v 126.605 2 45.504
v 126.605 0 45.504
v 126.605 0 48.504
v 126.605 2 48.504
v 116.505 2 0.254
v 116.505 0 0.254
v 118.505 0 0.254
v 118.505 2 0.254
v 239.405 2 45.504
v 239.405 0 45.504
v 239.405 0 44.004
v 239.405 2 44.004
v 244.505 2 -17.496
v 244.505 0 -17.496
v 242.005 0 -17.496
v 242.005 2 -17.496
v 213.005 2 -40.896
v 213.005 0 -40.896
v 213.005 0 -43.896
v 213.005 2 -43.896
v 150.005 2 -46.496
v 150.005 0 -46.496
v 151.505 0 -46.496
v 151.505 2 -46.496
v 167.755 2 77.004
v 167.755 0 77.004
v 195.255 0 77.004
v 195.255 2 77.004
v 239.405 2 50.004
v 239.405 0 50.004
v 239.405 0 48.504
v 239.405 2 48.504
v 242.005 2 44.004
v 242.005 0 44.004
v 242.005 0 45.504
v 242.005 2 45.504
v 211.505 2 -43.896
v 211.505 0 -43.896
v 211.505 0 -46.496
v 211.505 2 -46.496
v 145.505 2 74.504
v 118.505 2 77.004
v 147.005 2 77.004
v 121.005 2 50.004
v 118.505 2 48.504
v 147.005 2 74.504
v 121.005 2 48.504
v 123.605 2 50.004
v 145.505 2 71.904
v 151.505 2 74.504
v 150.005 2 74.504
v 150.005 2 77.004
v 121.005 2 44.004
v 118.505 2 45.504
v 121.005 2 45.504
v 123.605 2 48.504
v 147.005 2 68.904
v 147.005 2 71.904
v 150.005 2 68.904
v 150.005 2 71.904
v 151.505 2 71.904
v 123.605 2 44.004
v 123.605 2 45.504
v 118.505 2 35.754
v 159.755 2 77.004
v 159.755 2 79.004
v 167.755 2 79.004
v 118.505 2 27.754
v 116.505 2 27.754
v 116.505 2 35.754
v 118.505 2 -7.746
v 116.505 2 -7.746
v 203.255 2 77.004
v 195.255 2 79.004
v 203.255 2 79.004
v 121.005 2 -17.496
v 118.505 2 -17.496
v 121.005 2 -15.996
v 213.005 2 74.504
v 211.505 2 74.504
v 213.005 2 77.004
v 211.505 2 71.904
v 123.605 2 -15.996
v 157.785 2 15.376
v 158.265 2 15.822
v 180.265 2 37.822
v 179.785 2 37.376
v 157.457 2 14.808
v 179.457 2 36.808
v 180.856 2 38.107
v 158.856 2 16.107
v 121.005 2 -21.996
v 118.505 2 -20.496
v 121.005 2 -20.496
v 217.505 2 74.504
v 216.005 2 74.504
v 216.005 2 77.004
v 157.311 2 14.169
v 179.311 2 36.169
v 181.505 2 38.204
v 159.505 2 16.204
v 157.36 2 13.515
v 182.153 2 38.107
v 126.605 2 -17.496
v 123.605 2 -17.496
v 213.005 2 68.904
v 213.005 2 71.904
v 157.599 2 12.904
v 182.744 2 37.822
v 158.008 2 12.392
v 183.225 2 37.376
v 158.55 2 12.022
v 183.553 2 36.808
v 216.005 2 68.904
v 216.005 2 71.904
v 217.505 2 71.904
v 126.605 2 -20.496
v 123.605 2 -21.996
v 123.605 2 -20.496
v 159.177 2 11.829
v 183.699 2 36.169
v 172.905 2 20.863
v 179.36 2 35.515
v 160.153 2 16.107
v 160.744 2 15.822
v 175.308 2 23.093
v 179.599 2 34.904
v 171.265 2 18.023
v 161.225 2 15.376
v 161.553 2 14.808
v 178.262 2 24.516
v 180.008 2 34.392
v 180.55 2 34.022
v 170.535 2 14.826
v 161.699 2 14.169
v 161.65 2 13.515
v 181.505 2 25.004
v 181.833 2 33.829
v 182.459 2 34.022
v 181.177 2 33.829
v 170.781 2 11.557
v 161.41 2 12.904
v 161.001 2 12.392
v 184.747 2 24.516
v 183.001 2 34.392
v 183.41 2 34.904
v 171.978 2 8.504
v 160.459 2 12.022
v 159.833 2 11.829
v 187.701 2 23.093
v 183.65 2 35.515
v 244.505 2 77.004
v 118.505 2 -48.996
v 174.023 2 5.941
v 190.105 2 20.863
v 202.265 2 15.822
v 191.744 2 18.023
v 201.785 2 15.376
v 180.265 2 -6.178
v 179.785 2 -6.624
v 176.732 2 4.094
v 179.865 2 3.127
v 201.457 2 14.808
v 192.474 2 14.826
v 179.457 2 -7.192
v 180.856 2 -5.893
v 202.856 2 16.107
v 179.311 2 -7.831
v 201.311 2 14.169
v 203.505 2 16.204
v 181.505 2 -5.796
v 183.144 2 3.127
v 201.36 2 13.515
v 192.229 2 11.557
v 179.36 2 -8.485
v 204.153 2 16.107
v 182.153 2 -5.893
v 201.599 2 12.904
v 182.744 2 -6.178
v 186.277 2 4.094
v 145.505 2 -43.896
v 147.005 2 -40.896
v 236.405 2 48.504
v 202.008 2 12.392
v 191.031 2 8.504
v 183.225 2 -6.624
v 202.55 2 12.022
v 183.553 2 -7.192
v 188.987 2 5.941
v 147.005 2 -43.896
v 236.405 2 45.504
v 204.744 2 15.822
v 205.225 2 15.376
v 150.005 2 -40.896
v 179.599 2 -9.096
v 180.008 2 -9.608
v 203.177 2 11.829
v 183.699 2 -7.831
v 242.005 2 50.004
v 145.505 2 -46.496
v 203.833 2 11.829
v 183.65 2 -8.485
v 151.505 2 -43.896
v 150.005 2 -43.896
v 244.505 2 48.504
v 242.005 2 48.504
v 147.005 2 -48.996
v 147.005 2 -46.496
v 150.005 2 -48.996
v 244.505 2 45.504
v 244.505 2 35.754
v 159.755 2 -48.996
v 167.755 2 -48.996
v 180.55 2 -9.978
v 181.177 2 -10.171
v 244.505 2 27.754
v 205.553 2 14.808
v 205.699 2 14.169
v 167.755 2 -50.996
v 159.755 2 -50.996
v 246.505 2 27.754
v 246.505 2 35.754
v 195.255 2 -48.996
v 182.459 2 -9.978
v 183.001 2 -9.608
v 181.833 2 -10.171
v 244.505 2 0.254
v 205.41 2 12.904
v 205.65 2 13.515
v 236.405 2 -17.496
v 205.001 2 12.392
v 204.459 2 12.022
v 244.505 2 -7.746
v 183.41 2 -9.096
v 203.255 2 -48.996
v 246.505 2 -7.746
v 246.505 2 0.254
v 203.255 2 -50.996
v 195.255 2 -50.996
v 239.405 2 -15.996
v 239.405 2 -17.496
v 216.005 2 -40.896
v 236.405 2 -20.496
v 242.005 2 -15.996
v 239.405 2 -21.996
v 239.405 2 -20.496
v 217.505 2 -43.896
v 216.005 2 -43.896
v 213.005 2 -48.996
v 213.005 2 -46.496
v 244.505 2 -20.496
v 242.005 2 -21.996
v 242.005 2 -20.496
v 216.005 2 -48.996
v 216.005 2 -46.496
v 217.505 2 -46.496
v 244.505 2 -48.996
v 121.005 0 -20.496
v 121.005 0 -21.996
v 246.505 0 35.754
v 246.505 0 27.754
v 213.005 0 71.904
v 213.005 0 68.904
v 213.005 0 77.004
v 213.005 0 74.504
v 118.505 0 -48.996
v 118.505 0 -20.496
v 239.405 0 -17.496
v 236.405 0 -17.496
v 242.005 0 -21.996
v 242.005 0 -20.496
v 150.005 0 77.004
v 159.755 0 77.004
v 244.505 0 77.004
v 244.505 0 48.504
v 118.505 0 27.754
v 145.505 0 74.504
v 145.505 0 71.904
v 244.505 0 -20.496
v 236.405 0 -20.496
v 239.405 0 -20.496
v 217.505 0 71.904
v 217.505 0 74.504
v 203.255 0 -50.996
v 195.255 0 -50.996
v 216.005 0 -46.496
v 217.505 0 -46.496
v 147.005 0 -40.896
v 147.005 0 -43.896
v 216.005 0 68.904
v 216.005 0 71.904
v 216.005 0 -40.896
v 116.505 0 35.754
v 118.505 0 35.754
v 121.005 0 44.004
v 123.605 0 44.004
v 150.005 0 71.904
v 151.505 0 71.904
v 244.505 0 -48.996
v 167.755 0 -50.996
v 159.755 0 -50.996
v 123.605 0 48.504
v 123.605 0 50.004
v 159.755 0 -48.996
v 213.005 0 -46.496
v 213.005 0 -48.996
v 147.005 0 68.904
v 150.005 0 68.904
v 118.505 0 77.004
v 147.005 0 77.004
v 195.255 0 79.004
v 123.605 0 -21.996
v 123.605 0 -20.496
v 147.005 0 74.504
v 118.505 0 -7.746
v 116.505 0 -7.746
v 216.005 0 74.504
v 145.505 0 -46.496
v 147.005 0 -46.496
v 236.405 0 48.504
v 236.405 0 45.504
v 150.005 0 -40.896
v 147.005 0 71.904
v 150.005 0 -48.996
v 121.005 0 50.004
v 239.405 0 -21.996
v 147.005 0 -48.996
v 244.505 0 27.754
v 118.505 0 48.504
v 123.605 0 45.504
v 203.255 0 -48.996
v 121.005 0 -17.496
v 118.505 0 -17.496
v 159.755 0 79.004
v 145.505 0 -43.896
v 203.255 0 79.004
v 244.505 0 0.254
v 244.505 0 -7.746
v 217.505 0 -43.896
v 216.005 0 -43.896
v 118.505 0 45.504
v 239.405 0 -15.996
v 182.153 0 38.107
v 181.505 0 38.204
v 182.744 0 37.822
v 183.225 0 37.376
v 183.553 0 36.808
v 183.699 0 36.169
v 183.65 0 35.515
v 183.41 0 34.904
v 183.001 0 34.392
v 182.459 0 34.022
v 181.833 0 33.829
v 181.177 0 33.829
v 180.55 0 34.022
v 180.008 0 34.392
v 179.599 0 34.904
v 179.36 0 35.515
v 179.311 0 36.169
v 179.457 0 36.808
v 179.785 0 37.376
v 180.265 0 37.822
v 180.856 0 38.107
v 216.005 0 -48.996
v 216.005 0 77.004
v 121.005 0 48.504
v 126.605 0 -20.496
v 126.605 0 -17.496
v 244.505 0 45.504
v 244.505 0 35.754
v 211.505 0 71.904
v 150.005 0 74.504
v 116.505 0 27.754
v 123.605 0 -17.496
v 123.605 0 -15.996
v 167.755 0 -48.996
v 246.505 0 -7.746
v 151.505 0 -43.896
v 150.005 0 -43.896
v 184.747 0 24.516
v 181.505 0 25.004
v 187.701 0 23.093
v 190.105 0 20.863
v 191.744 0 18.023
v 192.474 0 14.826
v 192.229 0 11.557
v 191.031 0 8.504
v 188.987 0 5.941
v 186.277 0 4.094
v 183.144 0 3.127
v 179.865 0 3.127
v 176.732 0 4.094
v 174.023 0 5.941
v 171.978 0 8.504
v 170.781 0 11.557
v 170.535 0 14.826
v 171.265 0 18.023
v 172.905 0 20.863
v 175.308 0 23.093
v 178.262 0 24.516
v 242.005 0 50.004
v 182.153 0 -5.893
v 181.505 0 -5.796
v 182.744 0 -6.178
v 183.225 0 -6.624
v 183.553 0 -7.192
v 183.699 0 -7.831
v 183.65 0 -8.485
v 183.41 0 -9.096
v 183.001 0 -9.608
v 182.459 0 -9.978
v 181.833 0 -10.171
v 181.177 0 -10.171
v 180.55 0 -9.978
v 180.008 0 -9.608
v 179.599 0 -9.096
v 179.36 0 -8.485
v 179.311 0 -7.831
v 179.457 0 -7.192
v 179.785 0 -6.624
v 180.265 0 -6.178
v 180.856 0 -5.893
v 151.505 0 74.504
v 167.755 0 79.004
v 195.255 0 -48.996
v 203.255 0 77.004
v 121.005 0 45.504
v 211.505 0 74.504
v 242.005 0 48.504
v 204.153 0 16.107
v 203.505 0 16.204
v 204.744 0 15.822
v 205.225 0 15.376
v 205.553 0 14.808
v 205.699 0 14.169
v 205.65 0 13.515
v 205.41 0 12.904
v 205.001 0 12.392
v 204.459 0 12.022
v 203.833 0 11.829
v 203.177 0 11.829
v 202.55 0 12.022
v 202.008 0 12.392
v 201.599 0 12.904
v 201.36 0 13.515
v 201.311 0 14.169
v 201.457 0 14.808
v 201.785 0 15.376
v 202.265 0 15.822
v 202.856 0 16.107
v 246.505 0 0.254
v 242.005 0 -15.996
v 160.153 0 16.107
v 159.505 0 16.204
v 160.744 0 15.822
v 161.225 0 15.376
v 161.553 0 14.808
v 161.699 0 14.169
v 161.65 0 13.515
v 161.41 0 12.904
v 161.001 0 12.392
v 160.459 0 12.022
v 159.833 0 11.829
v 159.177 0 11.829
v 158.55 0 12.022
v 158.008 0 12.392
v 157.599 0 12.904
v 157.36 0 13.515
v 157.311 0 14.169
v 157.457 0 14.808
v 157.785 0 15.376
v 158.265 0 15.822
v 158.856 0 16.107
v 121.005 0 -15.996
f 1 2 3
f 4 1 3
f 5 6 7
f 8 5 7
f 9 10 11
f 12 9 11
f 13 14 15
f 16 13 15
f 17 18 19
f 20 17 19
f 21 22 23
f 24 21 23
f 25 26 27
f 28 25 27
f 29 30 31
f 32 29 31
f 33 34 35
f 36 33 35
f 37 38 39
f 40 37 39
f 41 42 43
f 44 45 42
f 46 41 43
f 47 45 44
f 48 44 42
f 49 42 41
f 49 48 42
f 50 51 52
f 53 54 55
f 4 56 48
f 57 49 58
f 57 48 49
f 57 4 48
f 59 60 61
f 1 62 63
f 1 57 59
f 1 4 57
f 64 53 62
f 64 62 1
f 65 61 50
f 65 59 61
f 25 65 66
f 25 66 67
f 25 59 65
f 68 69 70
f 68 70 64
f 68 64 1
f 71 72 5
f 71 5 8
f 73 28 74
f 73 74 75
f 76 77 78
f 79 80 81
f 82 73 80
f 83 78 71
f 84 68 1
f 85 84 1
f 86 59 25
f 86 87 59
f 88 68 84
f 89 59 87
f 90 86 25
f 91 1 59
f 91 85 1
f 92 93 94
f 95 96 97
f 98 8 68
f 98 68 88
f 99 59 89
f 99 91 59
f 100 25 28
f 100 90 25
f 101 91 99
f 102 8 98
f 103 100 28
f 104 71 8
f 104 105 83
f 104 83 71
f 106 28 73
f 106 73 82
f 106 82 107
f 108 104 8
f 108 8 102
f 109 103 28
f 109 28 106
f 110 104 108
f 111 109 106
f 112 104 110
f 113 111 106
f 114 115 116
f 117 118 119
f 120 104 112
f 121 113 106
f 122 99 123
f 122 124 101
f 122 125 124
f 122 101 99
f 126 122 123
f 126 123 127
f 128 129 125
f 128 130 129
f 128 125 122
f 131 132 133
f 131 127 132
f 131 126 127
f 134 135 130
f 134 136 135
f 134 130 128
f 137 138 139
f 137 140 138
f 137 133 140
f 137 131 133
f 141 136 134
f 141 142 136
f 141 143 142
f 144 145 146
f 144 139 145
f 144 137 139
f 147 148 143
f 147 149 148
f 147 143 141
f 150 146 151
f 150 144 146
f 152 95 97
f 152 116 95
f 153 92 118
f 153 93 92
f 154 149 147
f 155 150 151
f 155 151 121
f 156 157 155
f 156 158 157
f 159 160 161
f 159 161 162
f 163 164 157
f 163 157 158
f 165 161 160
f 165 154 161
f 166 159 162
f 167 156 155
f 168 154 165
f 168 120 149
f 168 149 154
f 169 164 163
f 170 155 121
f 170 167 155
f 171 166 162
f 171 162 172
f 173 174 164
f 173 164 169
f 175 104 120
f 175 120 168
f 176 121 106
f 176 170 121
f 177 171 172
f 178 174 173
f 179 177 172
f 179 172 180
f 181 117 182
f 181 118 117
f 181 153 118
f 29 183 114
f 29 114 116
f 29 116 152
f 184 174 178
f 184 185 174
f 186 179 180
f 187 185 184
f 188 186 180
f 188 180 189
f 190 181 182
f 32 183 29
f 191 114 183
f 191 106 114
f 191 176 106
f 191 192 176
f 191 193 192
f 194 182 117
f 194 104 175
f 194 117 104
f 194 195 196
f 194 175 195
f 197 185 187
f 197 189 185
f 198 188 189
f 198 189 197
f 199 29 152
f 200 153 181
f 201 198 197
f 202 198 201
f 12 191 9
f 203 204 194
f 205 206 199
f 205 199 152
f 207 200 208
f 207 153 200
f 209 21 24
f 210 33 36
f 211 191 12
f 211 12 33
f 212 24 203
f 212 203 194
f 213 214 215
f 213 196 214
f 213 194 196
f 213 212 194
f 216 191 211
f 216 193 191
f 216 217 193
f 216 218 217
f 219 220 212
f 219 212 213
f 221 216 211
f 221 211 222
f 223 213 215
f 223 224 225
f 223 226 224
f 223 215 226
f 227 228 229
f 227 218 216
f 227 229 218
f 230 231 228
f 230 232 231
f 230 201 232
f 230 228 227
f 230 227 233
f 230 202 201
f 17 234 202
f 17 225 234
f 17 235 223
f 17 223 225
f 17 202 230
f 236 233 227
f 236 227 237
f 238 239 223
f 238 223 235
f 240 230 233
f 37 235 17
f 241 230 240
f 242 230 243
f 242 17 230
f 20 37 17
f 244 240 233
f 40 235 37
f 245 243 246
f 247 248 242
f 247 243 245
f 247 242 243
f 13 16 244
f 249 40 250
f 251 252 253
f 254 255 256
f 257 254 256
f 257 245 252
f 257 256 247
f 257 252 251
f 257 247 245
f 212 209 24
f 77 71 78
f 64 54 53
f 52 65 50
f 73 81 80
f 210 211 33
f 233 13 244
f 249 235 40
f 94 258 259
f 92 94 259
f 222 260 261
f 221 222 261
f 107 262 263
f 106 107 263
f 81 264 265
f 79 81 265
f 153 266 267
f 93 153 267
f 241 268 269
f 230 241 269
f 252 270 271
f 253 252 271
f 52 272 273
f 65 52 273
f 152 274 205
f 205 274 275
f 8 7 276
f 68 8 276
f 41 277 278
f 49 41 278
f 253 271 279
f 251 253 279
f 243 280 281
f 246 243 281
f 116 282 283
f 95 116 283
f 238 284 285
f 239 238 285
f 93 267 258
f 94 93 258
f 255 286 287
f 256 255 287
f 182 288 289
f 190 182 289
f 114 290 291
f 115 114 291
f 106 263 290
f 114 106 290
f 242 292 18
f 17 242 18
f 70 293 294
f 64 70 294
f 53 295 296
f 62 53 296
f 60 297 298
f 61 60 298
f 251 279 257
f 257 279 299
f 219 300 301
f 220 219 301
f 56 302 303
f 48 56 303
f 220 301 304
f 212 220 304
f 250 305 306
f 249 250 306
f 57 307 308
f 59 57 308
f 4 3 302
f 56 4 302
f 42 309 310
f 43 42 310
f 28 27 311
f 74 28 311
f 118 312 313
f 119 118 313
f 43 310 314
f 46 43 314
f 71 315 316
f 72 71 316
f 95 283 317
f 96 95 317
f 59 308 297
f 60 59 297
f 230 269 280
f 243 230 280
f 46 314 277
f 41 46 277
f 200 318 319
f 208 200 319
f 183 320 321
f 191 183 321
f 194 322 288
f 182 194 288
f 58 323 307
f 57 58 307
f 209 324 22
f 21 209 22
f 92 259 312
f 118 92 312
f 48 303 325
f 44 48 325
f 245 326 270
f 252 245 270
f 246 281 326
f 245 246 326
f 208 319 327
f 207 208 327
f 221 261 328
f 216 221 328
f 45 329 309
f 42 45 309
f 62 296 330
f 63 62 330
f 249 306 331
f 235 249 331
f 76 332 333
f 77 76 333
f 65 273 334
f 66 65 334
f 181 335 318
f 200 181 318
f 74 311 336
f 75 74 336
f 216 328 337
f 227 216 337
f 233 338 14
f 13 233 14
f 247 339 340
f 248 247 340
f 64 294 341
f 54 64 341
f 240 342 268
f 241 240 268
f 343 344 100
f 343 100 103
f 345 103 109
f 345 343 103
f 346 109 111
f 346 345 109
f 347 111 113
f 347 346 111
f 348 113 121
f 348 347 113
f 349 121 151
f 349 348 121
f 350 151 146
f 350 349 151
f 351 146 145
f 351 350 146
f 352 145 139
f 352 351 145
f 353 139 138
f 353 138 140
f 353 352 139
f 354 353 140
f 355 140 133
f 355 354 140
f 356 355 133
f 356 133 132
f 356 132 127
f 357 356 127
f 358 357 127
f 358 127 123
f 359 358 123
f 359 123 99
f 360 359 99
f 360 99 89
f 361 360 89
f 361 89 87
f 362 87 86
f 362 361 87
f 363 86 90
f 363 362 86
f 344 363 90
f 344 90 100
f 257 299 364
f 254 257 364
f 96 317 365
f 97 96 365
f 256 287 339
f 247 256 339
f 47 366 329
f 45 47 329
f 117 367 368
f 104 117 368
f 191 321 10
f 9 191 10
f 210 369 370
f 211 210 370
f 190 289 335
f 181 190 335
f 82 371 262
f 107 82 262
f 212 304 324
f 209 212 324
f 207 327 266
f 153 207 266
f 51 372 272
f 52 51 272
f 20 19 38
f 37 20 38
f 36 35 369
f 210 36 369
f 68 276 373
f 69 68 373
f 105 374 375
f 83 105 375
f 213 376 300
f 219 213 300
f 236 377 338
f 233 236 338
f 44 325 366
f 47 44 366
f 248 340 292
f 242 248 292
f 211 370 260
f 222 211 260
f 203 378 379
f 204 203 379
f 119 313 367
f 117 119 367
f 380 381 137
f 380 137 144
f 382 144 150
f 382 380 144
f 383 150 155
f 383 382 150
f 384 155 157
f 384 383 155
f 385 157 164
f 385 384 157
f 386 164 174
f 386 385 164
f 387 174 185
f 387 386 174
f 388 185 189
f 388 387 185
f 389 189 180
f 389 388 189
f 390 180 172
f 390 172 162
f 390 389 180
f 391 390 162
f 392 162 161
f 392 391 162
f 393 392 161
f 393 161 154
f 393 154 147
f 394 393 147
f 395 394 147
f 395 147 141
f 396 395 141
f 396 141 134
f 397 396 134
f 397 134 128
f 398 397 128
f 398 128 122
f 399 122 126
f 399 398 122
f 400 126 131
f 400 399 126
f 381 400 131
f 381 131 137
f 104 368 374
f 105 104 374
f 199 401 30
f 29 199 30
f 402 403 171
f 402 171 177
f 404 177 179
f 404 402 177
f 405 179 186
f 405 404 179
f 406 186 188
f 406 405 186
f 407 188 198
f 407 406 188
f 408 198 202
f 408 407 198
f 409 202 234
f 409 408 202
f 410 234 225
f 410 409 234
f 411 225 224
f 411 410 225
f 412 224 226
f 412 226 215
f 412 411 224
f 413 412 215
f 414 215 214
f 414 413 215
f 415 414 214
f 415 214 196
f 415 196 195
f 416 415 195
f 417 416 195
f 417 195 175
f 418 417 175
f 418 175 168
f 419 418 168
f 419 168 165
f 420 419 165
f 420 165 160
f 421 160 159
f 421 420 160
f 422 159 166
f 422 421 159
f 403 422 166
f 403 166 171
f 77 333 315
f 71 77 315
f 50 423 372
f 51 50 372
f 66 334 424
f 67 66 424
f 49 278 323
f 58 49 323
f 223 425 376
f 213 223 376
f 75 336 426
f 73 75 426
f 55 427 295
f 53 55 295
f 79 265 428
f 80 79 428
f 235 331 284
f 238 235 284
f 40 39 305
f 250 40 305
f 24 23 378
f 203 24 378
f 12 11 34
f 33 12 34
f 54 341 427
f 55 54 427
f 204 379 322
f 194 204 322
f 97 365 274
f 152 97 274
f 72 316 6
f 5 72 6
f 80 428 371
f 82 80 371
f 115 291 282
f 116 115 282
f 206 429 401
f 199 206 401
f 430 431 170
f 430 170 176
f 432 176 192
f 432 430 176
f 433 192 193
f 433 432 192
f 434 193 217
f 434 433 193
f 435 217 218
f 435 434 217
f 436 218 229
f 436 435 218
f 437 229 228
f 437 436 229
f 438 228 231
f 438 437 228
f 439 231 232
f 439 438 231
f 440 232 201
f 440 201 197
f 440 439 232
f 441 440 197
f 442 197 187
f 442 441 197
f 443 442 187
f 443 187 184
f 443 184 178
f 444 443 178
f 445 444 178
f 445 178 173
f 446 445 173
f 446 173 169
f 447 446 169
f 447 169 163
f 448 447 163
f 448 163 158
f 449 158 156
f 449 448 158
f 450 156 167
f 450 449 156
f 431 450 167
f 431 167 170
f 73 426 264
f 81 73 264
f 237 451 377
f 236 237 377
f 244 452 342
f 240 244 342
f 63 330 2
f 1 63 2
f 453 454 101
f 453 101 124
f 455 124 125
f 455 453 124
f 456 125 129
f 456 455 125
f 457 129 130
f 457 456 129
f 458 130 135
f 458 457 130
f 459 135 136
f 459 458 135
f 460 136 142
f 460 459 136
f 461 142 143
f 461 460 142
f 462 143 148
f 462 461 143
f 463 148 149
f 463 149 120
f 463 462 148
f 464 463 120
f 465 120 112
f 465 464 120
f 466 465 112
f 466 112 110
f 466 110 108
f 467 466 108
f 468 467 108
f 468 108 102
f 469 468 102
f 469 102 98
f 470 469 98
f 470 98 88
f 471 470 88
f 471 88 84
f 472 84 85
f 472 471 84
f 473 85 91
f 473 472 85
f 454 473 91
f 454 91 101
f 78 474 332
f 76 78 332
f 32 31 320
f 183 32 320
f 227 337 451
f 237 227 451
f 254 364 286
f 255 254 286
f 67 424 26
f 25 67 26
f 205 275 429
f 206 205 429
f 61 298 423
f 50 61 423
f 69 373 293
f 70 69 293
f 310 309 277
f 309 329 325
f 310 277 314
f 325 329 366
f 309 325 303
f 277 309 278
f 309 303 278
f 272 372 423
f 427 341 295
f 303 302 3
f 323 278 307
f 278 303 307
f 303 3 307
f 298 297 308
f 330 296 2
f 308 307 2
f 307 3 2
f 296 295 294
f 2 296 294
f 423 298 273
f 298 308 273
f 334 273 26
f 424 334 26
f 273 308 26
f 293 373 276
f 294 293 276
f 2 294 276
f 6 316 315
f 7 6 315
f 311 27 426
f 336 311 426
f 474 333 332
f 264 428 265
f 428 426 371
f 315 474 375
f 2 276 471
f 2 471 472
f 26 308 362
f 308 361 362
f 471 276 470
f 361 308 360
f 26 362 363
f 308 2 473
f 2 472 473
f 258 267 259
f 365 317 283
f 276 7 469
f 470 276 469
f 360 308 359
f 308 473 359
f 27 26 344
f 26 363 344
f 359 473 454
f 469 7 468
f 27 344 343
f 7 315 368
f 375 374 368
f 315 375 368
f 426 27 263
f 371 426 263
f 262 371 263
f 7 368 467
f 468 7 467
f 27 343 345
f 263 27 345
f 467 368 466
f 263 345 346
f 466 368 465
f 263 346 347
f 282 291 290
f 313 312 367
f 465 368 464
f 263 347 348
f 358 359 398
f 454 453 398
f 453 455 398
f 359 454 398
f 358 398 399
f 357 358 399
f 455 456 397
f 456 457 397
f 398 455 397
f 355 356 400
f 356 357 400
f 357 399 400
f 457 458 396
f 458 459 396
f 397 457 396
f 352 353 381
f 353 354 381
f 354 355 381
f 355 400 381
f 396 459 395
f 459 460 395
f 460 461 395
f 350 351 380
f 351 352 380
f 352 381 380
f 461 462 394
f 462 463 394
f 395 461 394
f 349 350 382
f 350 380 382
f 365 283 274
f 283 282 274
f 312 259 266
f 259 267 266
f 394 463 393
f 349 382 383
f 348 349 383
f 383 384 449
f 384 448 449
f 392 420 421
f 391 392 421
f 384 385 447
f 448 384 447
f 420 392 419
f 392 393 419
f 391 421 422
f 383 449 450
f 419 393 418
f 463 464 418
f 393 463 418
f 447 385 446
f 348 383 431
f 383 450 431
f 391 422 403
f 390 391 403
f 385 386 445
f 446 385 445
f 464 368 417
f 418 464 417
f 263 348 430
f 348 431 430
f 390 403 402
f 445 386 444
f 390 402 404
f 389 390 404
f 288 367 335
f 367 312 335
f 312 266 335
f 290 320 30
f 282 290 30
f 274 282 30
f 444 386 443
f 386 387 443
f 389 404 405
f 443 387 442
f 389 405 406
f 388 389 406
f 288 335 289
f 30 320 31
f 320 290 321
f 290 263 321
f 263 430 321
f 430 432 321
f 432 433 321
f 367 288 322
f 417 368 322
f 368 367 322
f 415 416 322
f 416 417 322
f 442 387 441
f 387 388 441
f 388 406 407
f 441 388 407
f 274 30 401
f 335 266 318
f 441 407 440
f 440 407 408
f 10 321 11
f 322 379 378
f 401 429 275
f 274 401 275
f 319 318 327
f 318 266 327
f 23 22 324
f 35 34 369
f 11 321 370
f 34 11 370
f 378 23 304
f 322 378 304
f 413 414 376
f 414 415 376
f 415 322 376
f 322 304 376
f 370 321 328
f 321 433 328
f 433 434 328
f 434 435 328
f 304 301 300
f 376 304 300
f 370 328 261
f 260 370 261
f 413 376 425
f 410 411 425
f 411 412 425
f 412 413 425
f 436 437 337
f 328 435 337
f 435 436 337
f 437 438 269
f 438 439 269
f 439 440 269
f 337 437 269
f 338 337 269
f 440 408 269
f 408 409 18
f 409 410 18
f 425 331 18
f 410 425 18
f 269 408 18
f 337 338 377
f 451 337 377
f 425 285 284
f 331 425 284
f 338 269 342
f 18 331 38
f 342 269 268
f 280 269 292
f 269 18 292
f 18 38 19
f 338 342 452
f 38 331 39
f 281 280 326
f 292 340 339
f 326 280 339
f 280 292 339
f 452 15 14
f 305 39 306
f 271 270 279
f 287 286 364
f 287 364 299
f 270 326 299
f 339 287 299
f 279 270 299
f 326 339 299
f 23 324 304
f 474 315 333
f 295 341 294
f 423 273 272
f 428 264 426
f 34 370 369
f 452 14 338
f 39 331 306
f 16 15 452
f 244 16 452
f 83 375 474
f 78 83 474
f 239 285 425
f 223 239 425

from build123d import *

# Parameters (mm, degrees)
SKETCH_1_R      = 11
SKETCH_1_R_2    = 2.2
EXTRUDE_1_DEPTH = 2


with BuildPart() as part:
    # 草图1 → 凸台-拉伸1 (new body)
    with BuildSketch(Plane(origin=(0, 0, 0), x_dir=(1, 0, 0), z_dir=(0, 1, 0))):
        Polygon((159.754738648, 48.995603023), (150.004738648, 48.995603023), (150.004738648, 46.495603023), (151.504738648, 46.495603023), (151.504738648, 43.895603023), (150.004738648, 43.895603023), (150.004738648, 40.895603023), (147.004738648, 40.895603023), (147.004738648, 43.895603023), (145.504738648, 43.895603023), (145.504738648, 46.495603023), (147.004738648, 46.495603023), (147.004738648, 48.995603023), (138.604738648, 48.995603023), (133.504738648, 48.995603023), (118.504738648, 48.995603023), (118.504738648, 33.995603023), (118.504738648, 21.495603023), (118.504738648, 20.495603023), (121.004738648, 20.495603023), (121.004738648, 21.995603023), (123.604738648, 21.995603023), (123.604738648, 20.495603023), (126.604738648, 20.495603023), (126.604738648, 17.495603023), (123.604738648, 17.495603023), (123.604738648, 15.995603023), (121.004738648, 15.995603023), (121.004738648, 17.495603023), (118.504738648, 17.495603023), (118.504738648, 7.745603023), (116.504738648, 7.745603023), (116.504738648, -0.254396977), (118.504738648, -0.254396977), (118.504738648, -27.754396977), (116.504738648, -27.754396977), (116.504738648, -35.754396977), (118.504738648, -35.754396977), (118.504738648, -45.504396977), (121.004738648, -45.504396977), (121.004738648, -44.004396977), (123.604738648, -44.004396977), (123.604738648, -45.504396977), (126.604738648, -45.504396977), (126.604738648, -48.504396977), (123.604738648, -48.504396977), (123.604738648, -50.004396977), (121.004738648, -50.004396977), (121.004738648, -48.504396977), (118.504738648, -48.504396977), (118.504738648, -56.904396977), (118.504738648, -62.004396977), (118.504738648, -77.004396977), (133.504738648, -77.004396977), (146.004738648, -77.004396977), (147.004738648, -77.004396977), (147.004738648, -74.504396977), (145.504738648, -74.504396977), (145.504738648, -71.904396977), (147.004738648, -71.904396977), (147.004738648, -68.904396977), (150.004738648, -68.904396977), (150.004738648, -71.904396977), (151.504738648, -71.904396977), (151.504738648, -74.504396977), (150.004738648, -74.504396977), (150.004738648, -77.004396977), (159.754738648, -77.004396977), (159.754738648, -79.004396977), (167.754738648, -79.004396977), (167.754738648, -77.004396977), (195.254738648, -77.004396977), (195.254738648, -79.004396977), (203.254738648, -79.004396977), (203.254738648, -77.004396977), (213.004738648, -77.004396977), (213.004738648, -74.504396977), (211.504738648, -74.504396977), (211.504738648, -71.904396977), (213.004738648, -71.904396977), (213.004738648, -68.904396977), (216.004738648, -68.904396977), (216.004738648, -71.904396977), (217.504738648, -71.904396977), (217.504738648, -74.504396977), (216.004738648, -74.504396977), (216.004738648, -77.004396977), (224.404738648, -77.004396977), (229.504738648, -77.004396977), (244.504738648, -77.004396977), (244.504738648, -62.004396977), (244.504738648, -49.504396977), (244.504738648, -48.504396977), (242.004738648, -48.504396977), (242.004738648, -50.004396977), (239.404738648, -50.004396977), (239.404738648, -48.504396977), (236.404738648, -48.504396977), (236.404738648, -45.504396977), (239.404738648, -45.504396977), (239.404738648, -44.004396977), (242.004738648, -44.004396977), (242.004738648, -45.504396977), (244.504738648, -45.504396977), (244.504738648, -35.754396977), (246.504738648, -35.754396977), (246.504738648, -27.754396977), (244.504738648, -27.754396977), (244.504738648, -0.254396977), (246.504738648, -0.254396977), (246.504738648, 7.745603023), (244.504738648, 7.745603023), (244.504738648, 17.495603023), (242.004738648, 17.495603023), (242.004738648, 15.995603023), (239.404738648, 15.995603023), (239.404738648, 17.495603023), (236.404738648, 17.495603023), (236.404738648, 20.495603023), (239.404738648, 20.495603023), (239.404738648, 21.995603023), (242.004738648, 21.995603023), (242.004738648, 20.495603023), (244.504738648, 20.495603023), (244.504738648, 28.895603023), (244.504738648, 33.995603023), (244.504738648, 48.995603023), (229.504738648, 48.995603023), (217.004738648, 48.995603023), (216.004738648, 48.995603023), (216.004738648, 46.495603023), (217.504738648, 46.495603023), (217.504738648, 43.895603023), (216.004738648, 43.895603023), (216.004738648, 40.895603023), (213.004738648, 40.895603023), (213.004738648, 43.895603023), (211.504738648, 43.895603023), (211.504738648, 46.495603023), (213.004738648, 46.495603023), (213.004738648, 48.995603023), (203.254738648, 48.995603023), (203.254738648, 50.995603023), (195.254738648, 50.995603023), (195.254738648, 48.995603023), (167.754738648, 48.995603023), (167.754738648, 50.995603023), (159.754738648, 50.995603023), align=None)
        with Locations(Location((181.504738648, -14.004396977, 0), (0, 0, 270))):
            Circle(SKETCH_1_R, mode=Mode.SUBTRACT)
        with Locations(Location((181.504738648, -36.004396977, 0), (0, 0, 270))):
            Circle(SKETCH_1_R_2, mode=Mode.SUBTRACT)
        with Locations(Location((159.504738648, -14.004396977, 0), (0, 0, 270))):
            Circle(SKETCH_1_R_2, mode=Mode.SUBTRACT)
        with Locations(Location((181.504738648, 7.995603023, 0), (0, 0, 270))):
            Circle(SKETCH_1_R_2, mode=Mode.SUBTRACT)
        with Locations(Location((203.504738648, -14.004396977, 0), (0, 0, 270))):
            Circle(SKETCH_1_R_2, mode=Mode.SUBTRACT)
    extrude(amount=EXTRUDE_1_DEPTH)


solid = part.part
